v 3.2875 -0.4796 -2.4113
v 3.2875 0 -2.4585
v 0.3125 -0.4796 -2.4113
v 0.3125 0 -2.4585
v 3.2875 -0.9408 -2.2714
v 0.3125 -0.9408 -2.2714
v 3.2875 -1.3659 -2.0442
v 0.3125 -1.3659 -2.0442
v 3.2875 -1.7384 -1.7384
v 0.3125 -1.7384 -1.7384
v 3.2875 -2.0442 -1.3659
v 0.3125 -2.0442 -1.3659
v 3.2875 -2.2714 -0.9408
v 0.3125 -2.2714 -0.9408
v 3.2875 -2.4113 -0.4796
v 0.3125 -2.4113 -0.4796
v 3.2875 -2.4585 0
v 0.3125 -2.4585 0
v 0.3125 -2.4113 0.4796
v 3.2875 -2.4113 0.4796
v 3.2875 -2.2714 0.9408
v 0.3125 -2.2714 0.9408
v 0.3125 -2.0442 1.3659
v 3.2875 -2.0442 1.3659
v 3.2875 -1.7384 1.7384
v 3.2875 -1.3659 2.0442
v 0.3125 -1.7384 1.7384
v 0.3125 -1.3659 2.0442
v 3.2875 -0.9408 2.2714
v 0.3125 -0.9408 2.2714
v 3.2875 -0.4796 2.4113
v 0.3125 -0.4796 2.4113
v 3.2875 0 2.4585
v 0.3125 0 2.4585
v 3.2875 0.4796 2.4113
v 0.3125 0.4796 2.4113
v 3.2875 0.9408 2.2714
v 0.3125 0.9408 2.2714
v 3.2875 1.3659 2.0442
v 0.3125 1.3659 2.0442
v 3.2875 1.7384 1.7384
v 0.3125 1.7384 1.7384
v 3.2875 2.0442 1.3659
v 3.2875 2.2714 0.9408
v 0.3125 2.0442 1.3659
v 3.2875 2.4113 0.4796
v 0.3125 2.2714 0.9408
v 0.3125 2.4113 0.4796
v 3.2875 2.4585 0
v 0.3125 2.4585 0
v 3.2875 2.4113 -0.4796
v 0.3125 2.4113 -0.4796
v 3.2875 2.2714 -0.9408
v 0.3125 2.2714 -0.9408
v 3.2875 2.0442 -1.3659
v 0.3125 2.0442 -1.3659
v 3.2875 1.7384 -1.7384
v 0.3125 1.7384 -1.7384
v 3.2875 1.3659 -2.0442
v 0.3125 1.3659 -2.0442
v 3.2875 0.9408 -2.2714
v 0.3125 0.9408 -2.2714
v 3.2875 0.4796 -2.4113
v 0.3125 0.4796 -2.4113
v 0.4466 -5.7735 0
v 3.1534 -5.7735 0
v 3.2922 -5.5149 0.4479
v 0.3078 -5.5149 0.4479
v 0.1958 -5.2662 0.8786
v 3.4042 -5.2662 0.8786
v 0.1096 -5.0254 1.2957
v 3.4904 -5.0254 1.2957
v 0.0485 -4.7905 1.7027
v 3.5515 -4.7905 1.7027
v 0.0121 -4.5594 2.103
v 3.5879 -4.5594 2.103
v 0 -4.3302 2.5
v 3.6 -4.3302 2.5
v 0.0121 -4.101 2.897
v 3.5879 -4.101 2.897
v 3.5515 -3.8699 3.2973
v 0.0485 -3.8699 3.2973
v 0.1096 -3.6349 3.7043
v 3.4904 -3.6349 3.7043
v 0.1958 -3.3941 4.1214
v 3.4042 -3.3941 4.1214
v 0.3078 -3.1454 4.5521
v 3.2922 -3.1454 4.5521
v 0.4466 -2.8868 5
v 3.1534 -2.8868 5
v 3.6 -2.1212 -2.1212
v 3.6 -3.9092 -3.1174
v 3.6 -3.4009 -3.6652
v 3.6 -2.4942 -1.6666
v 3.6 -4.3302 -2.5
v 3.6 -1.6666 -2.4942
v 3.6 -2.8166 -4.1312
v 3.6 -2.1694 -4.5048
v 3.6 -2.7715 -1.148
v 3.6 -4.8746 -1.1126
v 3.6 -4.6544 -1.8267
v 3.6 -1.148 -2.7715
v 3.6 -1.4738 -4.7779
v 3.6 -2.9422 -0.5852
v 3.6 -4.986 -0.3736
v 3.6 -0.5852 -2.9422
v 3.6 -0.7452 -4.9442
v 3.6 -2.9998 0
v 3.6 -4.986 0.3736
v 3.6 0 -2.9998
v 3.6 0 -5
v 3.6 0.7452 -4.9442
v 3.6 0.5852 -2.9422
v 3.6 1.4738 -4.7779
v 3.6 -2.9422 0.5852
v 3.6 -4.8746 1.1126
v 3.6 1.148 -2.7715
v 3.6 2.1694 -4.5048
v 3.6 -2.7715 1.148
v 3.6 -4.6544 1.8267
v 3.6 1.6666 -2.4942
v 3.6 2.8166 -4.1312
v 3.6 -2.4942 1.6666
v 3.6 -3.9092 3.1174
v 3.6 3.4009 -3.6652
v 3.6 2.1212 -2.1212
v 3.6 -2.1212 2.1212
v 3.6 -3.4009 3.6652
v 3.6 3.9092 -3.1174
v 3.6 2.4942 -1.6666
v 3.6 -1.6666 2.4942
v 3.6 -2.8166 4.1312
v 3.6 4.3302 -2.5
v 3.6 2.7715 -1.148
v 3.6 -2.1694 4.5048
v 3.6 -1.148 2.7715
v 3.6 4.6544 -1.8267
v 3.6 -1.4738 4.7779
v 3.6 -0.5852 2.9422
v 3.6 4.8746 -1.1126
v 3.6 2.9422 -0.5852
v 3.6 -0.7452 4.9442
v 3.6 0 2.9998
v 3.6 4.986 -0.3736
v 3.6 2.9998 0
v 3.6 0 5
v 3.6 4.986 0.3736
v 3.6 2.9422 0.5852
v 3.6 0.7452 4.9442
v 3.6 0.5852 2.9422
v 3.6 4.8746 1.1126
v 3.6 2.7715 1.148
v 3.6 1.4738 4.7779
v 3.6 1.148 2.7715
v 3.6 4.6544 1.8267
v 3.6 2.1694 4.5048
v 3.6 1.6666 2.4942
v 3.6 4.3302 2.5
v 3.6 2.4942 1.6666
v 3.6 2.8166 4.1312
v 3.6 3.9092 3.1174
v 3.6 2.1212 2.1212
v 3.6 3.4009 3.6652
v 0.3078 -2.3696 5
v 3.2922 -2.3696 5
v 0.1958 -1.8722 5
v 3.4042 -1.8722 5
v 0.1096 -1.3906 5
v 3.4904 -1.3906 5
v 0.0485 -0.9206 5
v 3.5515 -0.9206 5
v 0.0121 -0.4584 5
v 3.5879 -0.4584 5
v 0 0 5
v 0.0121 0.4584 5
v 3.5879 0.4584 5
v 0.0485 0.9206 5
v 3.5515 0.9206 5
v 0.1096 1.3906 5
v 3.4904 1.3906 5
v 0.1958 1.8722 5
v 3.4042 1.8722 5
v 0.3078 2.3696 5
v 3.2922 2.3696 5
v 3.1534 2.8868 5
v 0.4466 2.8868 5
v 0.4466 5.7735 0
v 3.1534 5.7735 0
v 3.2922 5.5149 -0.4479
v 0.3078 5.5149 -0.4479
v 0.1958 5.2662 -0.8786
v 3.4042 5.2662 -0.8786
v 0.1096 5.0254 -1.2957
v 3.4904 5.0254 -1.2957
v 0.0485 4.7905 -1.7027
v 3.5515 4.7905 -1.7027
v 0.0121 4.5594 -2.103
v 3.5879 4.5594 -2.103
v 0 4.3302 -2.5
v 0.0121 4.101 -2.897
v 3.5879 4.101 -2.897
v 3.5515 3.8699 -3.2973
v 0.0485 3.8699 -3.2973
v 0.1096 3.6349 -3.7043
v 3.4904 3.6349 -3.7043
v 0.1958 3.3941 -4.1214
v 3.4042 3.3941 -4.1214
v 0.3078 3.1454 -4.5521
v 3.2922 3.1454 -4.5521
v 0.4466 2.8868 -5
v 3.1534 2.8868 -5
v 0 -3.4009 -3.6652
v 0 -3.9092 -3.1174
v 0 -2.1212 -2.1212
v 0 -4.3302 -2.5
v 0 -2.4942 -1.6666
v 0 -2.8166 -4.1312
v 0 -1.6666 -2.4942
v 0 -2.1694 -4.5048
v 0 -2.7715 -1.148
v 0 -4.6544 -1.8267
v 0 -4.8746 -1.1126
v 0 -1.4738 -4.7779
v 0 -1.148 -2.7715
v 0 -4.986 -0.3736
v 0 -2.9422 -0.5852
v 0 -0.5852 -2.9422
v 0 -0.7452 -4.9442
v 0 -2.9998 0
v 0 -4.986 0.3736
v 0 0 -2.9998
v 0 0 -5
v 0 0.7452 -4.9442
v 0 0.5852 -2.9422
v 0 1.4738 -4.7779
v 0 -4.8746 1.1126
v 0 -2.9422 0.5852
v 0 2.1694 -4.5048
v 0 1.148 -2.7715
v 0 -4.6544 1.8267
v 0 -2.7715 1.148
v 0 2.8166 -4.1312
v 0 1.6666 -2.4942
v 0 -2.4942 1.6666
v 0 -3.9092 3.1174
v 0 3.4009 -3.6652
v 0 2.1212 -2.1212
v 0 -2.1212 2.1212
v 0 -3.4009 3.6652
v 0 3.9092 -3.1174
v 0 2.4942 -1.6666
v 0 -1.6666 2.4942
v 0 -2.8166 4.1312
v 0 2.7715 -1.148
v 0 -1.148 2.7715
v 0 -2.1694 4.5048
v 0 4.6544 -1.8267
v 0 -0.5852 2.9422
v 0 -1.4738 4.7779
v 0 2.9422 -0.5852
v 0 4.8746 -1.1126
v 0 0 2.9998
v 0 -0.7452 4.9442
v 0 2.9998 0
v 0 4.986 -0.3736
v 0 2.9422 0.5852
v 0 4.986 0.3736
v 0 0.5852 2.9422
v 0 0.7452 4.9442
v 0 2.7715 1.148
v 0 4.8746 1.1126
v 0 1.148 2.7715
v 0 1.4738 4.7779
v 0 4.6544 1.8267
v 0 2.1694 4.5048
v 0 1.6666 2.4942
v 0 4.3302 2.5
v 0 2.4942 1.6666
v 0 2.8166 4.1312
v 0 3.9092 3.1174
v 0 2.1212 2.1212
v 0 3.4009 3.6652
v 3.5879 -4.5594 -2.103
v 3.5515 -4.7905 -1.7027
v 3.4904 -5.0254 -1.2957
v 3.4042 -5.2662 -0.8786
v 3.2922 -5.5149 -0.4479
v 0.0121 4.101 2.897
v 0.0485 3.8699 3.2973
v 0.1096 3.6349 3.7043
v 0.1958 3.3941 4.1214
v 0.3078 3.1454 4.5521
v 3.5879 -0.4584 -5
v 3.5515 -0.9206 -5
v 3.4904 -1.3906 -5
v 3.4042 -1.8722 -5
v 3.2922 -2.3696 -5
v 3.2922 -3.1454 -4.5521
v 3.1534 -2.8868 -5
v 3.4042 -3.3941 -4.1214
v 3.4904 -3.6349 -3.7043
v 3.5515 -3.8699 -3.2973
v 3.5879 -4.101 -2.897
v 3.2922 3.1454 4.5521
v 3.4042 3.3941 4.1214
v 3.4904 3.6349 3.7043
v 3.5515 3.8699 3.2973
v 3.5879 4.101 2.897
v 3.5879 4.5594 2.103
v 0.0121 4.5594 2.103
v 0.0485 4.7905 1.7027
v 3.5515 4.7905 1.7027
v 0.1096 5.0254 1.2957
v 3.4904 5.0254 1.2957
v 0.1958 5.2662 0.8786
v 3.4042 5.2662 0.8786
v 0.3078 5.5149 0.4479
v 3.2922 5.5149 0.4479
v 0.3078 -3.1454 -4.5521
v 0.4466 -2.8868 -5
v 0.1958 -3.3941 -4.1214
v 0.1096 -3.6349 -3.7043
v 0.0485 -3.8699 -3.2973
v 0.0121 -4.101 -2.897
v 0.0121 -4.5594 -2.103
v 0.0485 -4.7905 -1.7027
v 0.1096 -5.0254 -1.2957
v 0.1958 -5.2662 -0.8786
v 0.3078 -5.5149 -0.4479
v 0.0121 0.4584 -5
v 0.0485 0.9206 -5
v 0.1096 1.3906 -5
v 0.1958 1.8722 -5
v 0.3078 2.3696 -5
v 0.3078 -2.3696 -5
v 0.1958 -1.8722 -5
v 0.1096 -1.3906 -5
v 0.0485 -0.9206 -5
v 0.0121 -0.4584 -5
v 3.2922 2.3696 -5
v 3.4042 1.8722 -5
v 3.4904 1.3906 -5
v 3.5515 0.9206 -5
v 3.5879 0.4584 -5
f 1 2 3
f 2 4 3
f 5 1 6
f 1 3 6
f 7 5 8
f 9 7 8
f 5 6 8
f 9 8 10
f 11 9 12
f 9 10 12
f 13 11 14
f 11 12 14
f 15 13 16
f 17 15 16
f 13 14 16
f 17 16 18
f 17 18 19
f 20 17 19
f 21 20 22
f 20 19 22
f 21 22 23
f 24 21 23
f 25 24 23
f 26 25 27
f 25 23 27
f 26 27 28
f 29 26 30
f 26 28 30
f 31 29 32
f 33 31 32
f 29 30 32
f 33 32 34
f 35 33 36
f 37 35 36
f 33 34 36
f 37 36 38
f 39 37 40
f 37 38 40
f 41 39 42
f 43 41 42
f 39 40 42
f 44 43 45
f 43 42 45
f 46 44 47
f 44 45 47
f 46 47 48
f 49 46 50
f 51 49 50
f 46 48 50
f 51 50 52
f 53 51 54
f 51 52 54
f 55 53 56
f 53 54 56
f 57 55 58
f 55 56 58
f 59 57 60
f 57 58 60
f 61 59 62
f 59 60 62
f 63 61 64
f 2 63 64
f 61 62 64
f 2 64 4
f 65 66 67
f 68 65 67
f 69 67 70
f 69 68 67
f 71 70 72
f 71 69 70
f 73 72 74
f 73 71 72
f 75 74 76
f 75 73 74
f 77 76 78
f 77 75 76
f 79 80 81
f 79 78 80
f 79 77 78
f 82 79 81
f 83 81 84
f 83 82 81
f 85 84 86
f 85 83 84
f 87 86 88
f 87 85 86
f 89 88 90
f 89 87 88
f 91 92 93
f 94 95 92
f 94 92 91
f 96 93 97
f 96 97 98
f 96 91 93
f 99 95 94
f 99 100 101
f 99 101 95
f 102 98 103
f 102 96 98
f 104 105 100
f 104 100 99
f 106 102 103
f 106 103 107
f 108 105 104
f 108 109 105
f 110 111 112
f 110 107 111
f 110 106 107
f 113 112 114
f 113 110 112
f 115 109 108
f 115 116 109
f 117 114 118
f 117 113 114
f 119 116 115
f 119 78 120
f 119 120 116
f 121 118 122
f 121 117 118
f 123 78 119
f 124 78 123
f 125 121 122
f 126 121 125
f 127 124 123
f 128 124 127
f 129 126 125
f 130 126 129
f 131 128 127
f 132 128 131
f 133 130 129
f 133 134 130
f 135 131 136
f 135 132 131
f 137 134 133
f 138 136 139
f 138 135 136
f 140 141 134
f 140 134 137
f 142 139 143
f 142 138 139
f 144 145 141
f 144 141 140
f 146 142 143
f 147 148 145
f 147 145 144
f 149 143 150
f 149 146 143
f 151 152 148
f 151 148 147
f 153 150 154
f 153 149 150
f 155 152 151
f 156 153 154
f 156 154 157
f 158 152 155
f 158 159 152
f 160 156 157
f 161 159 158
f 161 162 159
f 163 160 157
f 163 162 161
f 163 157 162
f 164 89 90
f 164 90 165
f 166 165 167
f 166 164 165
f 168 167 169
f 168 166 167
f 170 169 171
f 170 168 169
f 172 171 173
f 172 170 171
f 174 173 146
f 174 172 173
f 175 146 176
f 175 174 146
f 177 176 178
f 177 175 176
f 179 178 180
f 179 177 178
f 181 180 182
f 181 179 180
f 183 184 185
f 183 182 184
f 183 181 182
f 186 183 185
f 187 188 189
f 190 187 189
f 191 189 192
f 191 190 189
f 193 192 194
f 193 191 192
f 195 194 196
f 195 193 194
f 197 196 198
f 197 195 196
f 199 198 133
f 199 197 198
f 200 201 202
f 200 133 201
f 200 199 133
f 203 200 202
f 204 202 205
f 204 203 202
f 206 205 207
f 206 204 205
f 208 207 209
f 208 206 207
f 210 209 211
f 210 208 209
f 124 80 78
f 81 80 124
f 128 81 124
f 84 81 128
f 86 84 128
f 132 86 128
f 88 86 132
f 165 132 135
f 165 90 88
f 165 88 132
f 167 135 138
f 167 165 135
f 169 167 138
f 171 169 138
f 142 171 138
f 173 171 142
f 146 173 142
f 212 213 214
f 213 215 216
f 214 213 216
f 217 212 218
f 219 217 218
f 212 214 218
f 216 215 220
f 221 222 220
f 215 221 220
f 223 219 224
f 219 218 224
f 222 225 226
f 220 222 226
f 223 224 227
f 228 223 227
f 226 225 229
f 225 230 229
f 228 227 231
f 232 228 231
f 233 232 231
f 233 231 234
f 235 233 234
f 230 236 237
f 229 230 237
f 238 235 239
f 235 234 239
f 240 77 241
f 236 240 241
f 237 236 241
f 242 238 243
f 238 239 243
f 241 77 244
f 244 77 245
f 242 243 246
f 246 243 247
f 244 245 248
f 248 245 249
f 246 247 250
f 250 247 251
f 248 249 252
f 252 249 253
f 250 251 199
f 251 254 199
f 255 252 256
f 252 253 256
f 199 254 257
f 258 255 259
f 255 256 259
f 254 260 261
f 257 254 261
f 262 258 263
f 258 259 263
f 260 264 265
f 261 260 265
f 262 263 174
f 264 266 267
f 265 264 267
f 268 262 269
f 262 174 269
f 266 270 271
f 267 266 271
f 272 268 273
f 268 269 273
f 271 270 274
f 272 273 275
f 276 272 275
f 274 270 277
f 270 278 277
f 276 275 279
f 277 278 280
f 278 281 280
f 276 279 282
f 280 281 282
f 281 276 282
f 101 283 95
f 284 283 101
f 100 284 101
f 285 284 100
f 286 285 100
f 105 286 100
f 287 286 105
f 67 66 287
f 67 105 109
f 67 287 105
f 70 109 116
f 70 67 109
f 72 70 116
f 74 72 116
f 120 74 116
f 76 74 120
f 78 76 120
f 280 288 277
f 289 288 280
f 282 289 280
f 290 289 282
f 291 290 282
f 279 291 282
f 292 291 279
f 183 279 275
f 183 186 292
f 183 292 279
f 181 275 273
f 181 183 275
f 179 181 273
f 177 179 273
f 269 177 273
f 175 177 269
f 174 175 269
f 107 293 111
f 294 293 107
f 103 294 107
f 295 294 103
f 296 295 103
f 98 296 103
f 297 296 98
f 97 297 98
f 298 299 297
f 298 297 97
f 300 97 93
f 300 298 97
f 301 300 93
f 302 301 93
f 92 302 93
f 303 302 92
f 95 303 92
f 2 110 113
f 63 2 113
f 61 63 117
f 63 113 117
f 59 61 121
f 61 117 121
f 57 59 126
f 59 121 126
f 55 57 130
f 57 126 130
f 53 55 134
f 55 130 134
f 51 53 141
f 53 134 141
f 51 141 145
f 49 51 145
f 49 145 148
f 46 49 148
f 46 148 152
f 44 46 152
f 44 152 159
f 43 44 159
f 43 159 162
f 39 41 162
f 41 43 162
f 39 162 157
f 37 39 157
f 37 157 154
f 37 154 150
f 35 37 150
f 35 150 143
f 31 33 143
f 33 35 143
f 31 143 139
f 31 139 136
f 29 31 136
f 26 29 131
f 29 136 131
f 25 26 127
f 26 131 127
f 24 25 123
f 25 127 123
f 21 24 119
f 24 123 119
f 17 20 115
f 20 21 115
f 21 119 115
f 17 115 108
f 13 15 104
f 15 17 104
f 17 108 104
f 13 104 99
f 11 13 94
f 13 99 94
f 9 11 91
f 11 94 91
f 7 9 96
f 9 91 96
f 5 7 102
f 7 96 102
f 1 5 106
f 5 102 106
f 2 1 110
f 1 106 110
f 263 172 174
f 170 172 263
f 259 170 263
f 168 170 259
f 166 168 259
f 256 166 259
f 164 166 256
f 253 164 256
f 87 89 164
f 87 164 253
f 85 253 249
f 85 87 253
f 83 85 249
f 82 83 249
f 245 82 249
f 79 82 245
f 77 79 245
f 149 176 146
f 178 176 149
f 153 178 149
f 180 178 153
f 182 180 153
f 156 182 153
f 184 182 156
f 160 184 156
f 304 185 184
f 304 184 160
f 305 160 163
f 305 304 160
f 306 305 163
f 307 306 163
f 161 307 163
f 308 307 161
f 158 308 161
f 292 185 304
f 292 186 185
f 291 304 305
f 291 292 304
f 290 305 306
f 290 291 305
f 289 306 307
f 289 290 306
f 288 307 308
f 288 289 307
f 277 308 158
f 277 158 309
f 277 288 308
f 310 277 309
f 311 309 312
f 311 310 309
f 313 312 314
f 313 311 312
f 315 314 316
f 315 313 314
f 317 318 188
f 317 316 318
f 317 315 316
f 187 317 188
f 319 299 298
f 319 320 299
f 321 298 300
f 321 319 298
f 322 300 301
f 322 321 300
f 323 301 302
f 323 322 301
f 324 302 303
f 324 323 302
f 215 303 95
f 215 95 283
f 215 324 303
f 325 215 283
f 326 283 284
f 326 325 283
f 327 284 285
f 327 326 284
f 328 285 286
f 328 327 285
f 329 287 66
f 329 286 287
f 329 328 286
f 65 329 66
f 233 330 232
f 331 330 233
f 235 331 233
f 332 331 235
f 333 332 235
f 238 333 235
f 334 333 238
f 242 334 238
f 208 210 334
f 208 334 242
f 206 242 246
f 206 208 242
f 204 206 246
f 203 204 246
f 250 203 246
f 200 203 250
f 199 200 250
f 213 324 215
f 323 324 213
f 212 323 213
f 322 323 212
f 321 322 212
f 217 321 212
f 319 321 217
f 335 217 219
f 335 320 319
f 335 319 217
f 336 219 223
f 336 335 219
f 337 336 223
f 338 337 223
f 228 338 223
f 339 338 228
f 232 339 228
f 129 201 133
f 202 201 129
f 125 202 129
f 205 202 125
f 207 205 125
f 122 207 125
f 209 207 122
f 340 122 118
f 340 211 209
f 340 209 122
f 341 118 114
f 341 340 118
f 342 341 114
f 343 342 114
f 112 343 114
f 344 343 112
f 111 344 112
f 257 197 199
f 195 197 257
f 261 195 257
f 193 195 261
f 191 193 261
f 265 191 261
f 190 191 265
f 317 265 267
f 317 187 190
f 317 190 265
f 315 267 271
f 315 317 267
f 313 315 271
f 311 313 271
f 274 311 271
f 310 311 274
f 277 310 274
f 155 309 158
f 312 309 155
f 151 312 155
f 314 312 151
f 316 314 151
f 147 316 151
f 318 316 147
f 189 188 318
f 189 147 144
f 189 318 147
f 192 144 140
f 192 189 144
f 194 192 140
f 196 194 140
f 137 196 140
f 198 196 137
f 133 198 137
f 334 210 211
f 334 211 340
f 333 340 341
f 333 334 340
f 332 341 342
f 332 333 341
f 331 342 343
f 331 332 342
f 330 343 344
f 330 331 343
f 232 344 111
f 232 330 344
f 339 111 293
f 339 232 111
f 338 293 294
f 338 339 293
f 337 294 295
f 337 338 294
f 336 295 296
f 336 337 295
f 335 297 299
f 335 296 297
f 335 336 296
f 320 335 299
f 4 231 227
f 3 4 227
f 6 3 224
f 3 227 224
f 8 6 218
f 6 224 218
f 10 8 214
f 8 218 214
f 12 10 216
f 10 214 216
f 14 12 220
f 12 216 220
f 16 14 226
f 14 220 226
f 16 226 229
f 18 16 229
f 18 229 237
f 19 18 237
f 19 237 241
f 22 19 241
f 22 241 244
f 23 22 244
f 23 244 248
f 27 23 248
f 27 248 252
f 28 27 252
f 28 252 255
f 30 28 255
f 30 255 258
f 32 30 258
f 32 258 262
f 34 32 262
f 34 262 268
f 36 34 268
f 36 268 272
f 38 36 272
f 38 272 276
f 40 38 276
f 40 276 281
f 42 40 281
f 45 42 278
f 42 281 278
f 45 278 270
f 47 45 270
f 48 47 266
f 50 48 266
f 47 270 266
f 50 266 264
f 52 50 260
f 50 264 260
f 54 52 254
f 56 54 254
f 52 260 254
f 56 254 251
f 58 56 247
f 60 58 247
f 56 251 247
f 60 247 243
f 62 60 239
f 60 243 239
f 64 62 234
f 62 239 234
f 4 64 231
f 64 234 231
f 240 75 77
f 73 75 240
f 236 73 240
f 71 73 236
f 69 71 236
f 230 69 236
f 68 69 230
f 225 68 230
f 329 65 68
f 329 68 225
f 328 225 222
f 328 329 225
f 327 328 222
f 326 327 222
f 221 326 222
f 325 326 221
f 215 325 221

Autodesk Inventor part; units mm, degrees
ref_plane "YZ Plane" through (0, 0, 0) normal (1, 0, 0) x (0, 1, 0)
ref_plane "XZ Plane" through (0, 0, 0) normal (0, 1, 0) x (-1, 0, 0)
sketch "Sketch1" plane through (0, 0, 0) normal (1, 0, 0) x (0, 1, 0)
  line L0 (-5.7735, 0) -> (-2.8868, 5)
  line L1 (-2.8868, 5) -> (2.8868, 5)
  line L2 (2.8868, 5) -> (5.7735, 0)
  line L3 (5.7735, 0) -> (2.8868, -5)
  line L4 (2.8868, -5) -> (-2.8868, -5)
  line L5 (-2.8868, -5) -> (-5.7735, 0)
  point P0 (0, 0)
  point P1 (0, 0)
  dimension "d0" = 11.547
extrude "Body" add sketch "Sketch1" along normal blind 3.6
sketch "Sketch2" plane through (0, 0, 0) normal (0, 0, 1) x (1, 0, 0)
  line L0 (0, 2.8868) -> (0, 5.7735) projected
  line L1 (0, 5.7735) -> (3.6, 5.7735) projected
  line L2 (3.6, 2.8868) -> (3.6, 5.7735) projected
  line L3 (-0.72, 0) -> (4.32, 0) projected
  line L4 (0.4466, 5.7735) -> (0, 5)
  line L5 (3.1534, 5.7735) -> (3.6, 5)
  dimension "d3" = 30
  dimension "d4" = 30
  dimension "d5" = 10
  dimension "d6" = 10
revolve "Chamfer1" cut sketch "Sketch2" angle 360 about axis through (-10, 0, 0) along (1, 0, 0)
sketch "Sketch3" plane through (3.6, 0, 0) normal (1, 0, 0) x (0, 0, -1)
  arc A0 (-2.5, -4.3301) -> (2.5, -4.3301) centre (0, 0) ccw projected
hole "Thread" at (3.6, 0, 0) direction (-1, 0, 0) diameter 4.917 end through all thread size "M6x1" class "6H" standard "ISO Metric profile"
chamfer "Chamfer2" distance 0.5413 angle 30 1 edges at (3.6, 0, 2.4585) measured on face at (3.6, 4.1286, -0.0988)
chamfer "Chamfer3" distance 0.5413 angle 30 1 edges at (0, 0, 2.4585) measured on face at (0, 4.1286, -0.0988)
ref_plane "Work Plane1" through (-12.0937, 0, 0) normal (0, -0.8660254, -0.5) x (1, 0, 0)
equation "\"d0\" = 1.1547 * SW"
equation "\"d1\" = KOH"
equation "\"d8\" = -0.5 * GD1 + 0.5 * NND"
equation "\"d40\" = -0.5 * GD1 + 0.5 * NND"
equation "\"d10\" = -0.5 * GD1 + 0.5 * NND"
equation "\"d41\" = -0.5 * GD1 + 0.5 * NND"
equation "\"d3\" = ANG1"
equation "\"d4\" = ANG2"
equation "\"d5\" = SW0"
equation "\"d6\" = SW01"
equation "\"ANG1\" = 30deg"
equation "\"ANG2\" = 30deg"
equation "\"NND\" = 6"
equation "\"KOH\" = 3.6"
equation "\"SW0\" = SW"
equation "\"SW01\" = SW"
equation "\"GUL\" = 0.541266 * PTC"
equation "\"THREADDIA\" = 6"
equation "\"TOA\" = 30deg"
equation "\"PTC\" = 1"
equation "\"E0\" = 1.155 * SW"
equation "\"GAL\" = 0.541266 * PTC"
equation "\"SW\" = 10"
equation "\"GD1\" = 4.917468"
properties part number "AS 1112 - M6" material "Steel, Mild"
